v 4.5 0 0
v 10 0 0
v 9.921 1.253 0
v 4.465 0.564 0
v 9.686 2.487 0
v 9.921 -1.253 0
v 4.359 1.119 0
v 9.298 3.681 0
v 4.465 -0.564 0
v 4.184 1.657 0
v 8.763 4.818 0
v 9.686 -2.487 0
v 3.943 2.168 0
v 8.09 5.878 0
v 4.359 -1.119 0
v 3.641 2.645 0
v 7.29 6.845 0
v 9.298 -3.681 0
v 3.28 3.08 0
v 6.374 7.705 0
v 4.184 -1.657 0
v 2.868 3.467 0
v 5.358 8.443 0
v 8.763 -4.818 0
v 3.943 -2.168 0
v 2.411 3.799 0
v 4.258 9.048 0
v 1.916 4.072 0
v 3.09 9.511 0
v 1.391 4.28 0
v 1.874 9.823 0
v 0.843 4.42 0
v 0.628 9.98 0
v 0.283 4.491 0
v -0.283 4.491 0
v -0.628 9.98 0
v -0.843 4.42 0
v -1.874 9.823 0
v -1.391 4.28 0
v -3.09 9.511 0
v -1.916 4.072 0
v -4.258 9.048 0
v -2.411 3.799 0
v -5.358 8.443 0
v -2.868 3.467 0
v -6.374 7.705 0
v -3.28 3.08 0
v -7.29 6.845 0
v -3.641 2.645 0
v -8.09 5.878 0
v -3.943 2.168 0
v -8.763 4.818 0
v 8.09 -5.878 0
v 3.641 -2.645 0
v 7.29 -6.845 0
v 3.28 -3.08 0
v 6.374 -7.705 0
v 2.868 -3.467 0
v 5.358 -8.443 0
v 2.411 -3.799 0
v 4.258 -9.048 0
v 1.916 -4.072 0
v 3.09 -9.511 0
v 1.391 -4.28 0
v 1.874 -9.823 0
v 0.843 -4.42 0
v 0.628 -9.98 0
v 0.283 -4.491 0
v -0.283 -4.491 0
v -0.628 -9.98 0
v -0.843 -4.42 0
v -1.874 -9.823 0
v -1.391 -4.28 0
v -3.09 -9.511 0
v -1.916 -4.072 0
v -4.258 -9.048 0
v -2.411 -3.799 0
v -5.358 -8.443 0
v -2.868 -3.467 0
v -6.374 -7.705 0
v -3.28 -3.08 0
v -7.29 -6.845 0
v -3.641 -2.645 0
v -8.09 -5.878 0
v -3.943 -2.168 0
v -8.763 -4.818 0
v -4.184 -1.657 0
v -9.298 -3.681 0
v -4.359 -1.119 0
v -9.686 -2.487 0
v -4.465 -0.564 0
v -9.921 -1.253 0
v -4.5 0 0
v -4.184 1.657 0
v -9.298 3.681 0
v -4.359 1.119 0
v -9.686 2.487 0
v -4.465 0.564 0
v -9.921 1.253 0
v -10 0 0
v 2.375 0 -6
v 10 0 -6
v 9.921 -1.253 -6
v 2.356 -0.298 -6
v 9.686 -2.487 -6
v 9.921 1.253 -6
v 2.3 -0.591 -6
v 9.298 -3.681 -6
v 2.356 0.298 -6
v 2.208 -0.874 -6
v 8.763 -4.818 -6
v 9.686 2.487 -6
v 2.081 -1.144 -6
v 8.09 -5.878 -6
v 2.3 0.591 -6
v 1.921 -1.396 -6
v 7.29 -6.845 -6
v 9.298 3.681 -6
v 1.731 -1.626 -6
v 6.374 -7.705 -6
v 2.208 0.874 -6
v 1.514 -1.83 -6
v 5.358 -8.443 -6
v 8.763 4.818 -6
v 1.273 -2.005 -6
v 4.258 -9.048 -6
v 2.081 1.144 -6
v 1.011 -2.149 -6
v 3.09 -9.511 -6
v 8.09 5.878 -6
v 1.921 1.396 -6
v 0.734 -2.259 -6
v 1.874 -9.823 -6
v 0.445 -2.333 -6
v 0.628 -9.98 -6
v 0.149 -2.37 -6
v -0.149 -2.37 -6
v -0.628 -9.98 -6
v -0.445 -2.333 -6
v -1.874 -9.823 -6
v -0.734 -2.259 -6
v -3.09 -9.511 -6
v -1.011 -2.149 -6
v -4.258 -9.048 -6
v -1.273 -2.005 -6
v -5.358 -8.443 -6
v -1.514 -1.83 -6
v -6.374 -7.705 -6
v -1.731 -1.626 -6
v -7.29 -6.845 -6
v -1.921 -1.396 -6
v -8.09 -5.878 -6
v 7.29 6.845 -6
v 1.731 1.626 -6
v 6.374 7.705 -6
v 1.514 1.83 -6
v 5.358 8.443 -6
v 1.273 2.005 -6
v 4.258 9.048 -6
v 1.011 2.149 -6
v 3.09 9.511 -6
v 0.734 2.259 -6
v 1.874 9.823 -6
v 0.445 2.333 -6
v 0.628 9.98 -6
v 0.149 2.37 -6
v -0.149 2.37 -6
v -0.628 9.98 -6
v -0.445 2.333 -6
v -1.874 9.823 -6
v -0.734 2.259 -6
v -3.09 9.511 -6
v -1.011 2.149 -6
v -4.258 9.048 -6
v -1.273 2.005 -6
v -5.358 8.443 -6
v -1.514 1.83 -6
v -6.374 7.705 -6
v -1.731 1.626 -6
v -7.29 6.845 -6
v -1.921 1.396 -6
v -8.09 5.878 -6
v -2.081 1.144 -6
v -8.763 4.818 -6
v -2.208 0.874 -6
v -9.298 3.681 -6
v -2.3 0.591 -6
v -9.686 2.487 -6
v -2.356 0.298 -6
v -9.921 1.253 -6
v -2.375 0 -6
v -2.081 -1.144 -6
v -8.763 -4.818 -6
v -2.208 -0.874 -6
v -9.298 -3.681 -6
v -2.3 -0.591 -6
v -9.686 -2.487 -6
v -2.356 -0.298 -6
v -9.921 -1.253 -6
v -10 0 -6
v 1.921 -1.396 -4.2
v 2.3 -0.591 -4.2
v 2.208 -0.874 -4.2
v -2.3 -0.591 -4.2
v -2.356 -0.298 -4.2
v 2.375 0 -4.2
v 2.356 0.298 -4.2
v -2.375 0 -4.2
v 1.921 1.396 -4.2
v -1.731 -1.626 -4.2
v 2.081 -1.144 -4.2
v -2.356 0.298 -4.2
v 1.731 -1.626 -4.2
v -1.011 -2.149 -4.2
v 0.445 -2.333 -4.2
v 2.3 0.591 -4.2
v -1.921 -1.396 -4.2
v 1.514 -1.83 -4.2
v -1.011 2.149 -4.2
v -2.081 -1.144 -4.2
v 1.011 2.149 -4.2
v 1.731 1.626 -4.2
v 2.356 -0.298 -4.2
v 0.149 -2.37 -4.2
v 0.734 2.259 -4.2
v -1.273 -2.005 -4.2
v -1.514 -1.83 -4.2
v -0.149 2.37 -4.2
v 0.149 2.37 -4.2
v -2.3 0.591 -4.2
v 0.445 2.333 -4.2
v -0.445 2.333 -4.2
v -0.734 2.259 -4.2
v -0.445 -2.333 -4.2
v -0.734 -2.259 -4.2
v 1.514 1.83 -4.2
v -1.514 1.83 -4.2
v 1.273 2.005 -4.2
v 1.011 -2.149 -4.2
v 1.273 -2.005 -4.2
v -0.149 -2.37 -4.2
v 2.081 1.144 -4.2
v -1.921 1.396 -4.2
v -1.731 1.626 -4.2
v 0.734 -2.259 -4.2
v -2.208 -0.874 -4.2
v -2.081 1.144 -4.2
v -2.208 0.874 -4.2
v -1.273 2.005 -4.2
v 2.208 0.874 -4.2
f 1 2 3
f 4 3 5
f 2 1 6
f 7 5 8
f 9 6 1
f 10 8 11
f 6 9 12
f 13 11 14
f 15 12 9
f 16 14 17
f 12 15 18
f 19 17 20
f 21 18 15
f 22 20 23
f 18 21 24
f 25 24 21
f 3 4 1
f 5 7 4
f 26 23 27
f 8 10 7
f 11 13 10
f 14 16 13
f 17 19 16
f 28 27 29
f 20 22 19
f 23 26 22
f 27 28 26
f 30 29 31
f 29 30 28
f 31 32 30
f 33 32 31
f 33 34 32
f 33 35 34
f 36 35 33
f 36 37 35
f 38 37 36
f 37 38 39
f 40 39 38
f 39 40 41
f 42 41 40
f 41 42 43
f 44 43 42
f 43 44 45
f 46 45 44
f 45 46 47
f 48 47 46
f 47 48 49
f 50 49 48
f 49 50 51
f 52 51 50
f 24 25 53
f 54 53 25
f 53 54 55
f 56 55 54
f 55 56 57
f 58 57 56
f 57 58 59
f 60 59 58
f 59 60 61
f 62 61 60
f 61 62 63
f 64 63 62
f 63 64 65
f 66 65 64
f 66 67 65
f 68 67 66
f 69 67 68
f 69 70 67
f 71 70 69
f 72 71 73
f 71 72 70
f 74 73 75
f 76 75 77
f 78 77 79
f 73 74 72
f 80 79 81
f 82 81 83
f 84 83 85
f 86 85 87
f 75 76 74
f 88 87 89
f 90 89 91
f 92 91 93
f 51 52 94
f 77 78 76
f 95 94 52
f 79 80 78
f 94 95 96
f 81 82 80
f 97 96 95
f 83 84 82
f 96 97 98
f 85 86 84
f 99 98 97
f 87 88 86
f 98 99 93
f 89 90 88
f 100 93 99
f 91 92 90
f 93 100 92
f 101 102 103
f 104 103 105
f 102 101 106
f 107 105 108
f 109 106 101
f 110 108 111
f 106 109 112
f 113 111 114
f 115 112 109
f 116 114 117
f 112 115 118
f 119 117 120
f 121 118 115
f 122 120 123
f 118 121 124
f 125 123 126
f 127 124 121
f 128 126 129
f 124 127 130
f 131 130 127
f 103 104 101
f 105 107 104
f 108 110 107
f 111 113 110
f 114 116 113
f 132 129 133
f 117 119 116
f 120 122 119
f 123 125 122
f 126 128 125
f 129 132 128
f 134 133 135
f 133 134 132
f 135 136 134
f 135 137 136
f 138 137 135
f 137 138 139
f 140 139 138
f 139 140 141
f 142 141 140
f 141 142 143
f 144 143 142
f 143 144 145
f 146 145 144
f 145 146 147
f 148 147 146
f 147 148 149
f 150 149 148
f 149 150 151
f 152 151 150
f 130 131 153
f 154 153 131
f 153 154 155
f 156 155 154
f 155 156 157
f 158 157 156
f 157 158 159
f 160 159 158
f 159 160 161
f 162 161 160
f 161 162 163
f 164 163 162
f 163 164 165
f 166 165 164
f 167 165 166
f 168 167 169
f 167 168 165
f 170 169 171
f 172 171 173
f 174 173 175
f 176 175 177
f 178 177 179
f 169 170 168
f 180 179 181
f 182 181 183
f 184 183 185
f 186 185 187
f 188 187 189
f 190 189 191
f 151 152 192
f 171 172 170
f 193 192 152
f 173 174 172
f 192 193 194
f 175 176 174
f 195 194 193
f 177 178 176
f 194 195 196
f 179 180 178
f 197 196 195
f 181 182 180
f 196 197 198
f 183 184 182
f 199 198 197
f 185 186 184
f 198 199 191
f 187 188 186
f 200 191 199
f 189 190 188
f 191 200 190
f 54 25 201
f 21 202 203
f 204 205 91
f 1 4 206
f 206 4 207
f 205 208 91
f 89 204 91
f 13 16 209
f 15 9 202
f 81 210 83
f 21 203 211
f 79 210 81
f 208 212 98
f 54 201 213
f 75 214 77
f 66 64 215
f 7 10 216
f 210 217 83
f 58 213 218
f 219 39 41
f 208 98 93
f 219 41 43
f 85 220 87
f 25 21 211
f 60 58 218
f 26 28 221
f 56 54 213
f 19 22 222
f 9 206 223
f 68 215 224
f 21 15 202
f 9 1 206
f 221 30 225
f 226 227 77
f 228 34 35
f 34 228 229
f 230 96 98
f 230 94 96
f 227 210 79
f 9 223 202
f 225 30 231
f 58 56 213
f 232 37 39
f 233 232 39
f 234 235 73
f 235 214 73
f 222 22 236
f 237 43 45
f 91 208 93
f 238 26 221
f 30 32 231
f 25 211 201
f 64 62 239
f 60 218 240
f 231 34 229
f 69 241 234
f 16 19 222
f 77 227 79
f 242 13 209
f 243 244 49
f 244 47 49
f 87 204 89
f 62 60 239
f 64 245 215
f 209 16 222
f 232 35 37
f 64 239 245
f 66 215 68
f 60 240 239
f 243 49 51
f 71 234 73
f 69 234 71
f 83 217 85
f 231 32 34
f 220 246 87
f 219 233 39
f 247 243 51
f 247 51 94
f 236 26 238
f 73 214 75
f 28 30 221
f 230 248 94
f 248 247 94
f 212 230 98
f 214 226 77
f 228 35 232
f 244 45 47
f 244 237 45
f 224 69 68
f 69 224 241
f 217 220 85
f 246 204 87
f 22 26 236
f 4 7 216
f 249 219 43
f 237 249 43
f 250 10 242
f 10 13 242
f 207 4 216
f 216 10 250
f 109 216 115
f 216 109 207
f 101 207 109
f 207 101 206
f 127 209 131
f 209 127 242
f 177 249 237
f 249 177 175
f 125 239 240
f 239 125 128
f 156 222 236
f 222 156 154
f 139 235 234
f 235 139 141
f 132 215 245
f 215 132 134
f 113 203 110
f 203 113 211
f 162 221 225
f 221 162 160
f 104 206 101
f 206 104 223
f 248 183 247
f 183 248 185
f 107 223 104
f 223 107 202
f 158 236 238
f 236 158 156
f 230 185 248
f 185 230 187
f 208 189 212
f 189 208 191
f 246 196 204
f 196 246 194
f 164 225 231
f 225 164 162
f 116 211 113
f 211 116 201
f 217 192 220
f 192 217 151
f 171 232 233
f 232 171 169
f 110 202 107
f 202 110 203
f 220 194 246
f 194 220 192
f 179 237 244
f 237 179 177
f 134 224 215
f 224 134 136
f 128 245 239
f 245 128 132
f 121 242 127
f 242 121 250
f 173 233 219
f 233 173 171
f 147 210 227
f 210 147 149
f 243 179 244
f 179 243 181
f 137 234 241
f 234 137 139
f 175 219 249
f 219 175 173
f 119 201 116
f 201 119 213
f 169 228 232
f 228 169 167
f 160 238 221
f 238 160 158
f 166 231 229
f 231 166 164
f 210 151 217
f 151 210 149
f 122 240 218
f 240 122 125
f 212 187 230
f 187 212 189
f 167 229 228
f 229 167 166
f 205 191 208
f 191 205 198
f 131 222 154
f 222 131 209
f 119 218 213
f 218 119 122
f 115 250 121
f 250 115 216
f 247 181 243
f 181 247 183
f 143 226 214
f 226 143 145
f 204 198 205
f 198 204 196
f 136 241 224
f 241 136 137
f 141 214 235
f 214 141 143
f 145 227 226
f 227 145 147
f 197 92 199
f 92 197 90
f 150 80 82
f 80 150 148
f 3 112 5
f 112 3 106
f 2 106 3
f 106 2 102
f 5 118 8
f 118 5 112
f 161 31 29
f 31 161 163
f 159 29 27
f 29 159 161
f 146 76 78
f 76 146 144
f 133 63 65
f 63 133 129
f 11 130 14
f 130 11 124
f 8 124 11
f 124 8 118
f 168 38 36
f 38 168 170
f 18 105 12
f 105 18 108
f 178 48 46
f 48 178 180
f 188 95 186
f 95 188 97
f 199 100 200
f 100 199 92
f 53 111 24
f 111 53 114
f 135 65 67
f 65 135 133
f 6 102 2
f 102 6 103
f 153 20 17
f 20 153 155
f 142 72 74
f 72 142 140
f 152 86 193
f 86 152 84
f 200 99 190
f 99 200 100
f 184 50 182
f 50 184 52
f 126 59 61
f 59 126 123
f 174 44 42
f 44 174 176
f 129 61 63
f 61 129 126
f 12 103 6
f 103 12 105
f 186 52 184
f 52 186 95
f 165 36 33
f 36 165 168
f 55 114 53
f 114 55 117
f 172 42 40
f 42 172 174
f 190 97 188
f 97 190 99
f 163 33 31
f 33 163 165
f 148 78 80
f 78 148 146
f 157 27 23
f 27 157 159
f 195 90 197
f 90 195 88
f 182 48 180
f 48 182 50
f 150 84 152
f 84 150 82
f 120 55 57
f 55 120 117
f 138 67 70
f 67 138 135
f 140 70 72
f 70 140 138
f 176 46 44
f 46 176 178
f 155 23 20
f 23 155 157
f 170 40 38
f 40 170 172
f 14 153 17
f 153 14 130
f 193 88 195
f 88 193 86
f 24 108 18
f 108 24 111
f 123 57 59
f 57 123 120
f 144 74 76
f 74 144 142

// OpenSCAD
$fn = 50;


difference() {
	union() {
		translate(v = [0, 0, -6.0000000000]) {
			cylinder(h = 6, r = 10.0000000000);
		}
		cylinder(h = 0, r = 13.0000000000);
	}
	union() {
		translate(v = [0, 0, 0]) {
			rotate(a = [0, 0, 0]) {
				difference() {
					union() {
						#translate(v = [0, 0, -6.0000000000]) {
							cylinder(h = 6, r = 2.2500000000);
						}
						#translate(v = [0, 0, -4.2000000000]) {
							cylinder(h = 4.2000000000, r1 = 2.3750000000, r2 = 4.5000000000);
						}
						#translate(v = [0, 0, -6.0000000000]) {
							cylinder(h = 6, r = 2.3750000000);
						}
						#translate(v = [0, 0, -6.0000000000]) {
							cylinder(h = 6, r = 2.2500000000);
						}
					}
					union();
				}
			}
		}
	}
}
